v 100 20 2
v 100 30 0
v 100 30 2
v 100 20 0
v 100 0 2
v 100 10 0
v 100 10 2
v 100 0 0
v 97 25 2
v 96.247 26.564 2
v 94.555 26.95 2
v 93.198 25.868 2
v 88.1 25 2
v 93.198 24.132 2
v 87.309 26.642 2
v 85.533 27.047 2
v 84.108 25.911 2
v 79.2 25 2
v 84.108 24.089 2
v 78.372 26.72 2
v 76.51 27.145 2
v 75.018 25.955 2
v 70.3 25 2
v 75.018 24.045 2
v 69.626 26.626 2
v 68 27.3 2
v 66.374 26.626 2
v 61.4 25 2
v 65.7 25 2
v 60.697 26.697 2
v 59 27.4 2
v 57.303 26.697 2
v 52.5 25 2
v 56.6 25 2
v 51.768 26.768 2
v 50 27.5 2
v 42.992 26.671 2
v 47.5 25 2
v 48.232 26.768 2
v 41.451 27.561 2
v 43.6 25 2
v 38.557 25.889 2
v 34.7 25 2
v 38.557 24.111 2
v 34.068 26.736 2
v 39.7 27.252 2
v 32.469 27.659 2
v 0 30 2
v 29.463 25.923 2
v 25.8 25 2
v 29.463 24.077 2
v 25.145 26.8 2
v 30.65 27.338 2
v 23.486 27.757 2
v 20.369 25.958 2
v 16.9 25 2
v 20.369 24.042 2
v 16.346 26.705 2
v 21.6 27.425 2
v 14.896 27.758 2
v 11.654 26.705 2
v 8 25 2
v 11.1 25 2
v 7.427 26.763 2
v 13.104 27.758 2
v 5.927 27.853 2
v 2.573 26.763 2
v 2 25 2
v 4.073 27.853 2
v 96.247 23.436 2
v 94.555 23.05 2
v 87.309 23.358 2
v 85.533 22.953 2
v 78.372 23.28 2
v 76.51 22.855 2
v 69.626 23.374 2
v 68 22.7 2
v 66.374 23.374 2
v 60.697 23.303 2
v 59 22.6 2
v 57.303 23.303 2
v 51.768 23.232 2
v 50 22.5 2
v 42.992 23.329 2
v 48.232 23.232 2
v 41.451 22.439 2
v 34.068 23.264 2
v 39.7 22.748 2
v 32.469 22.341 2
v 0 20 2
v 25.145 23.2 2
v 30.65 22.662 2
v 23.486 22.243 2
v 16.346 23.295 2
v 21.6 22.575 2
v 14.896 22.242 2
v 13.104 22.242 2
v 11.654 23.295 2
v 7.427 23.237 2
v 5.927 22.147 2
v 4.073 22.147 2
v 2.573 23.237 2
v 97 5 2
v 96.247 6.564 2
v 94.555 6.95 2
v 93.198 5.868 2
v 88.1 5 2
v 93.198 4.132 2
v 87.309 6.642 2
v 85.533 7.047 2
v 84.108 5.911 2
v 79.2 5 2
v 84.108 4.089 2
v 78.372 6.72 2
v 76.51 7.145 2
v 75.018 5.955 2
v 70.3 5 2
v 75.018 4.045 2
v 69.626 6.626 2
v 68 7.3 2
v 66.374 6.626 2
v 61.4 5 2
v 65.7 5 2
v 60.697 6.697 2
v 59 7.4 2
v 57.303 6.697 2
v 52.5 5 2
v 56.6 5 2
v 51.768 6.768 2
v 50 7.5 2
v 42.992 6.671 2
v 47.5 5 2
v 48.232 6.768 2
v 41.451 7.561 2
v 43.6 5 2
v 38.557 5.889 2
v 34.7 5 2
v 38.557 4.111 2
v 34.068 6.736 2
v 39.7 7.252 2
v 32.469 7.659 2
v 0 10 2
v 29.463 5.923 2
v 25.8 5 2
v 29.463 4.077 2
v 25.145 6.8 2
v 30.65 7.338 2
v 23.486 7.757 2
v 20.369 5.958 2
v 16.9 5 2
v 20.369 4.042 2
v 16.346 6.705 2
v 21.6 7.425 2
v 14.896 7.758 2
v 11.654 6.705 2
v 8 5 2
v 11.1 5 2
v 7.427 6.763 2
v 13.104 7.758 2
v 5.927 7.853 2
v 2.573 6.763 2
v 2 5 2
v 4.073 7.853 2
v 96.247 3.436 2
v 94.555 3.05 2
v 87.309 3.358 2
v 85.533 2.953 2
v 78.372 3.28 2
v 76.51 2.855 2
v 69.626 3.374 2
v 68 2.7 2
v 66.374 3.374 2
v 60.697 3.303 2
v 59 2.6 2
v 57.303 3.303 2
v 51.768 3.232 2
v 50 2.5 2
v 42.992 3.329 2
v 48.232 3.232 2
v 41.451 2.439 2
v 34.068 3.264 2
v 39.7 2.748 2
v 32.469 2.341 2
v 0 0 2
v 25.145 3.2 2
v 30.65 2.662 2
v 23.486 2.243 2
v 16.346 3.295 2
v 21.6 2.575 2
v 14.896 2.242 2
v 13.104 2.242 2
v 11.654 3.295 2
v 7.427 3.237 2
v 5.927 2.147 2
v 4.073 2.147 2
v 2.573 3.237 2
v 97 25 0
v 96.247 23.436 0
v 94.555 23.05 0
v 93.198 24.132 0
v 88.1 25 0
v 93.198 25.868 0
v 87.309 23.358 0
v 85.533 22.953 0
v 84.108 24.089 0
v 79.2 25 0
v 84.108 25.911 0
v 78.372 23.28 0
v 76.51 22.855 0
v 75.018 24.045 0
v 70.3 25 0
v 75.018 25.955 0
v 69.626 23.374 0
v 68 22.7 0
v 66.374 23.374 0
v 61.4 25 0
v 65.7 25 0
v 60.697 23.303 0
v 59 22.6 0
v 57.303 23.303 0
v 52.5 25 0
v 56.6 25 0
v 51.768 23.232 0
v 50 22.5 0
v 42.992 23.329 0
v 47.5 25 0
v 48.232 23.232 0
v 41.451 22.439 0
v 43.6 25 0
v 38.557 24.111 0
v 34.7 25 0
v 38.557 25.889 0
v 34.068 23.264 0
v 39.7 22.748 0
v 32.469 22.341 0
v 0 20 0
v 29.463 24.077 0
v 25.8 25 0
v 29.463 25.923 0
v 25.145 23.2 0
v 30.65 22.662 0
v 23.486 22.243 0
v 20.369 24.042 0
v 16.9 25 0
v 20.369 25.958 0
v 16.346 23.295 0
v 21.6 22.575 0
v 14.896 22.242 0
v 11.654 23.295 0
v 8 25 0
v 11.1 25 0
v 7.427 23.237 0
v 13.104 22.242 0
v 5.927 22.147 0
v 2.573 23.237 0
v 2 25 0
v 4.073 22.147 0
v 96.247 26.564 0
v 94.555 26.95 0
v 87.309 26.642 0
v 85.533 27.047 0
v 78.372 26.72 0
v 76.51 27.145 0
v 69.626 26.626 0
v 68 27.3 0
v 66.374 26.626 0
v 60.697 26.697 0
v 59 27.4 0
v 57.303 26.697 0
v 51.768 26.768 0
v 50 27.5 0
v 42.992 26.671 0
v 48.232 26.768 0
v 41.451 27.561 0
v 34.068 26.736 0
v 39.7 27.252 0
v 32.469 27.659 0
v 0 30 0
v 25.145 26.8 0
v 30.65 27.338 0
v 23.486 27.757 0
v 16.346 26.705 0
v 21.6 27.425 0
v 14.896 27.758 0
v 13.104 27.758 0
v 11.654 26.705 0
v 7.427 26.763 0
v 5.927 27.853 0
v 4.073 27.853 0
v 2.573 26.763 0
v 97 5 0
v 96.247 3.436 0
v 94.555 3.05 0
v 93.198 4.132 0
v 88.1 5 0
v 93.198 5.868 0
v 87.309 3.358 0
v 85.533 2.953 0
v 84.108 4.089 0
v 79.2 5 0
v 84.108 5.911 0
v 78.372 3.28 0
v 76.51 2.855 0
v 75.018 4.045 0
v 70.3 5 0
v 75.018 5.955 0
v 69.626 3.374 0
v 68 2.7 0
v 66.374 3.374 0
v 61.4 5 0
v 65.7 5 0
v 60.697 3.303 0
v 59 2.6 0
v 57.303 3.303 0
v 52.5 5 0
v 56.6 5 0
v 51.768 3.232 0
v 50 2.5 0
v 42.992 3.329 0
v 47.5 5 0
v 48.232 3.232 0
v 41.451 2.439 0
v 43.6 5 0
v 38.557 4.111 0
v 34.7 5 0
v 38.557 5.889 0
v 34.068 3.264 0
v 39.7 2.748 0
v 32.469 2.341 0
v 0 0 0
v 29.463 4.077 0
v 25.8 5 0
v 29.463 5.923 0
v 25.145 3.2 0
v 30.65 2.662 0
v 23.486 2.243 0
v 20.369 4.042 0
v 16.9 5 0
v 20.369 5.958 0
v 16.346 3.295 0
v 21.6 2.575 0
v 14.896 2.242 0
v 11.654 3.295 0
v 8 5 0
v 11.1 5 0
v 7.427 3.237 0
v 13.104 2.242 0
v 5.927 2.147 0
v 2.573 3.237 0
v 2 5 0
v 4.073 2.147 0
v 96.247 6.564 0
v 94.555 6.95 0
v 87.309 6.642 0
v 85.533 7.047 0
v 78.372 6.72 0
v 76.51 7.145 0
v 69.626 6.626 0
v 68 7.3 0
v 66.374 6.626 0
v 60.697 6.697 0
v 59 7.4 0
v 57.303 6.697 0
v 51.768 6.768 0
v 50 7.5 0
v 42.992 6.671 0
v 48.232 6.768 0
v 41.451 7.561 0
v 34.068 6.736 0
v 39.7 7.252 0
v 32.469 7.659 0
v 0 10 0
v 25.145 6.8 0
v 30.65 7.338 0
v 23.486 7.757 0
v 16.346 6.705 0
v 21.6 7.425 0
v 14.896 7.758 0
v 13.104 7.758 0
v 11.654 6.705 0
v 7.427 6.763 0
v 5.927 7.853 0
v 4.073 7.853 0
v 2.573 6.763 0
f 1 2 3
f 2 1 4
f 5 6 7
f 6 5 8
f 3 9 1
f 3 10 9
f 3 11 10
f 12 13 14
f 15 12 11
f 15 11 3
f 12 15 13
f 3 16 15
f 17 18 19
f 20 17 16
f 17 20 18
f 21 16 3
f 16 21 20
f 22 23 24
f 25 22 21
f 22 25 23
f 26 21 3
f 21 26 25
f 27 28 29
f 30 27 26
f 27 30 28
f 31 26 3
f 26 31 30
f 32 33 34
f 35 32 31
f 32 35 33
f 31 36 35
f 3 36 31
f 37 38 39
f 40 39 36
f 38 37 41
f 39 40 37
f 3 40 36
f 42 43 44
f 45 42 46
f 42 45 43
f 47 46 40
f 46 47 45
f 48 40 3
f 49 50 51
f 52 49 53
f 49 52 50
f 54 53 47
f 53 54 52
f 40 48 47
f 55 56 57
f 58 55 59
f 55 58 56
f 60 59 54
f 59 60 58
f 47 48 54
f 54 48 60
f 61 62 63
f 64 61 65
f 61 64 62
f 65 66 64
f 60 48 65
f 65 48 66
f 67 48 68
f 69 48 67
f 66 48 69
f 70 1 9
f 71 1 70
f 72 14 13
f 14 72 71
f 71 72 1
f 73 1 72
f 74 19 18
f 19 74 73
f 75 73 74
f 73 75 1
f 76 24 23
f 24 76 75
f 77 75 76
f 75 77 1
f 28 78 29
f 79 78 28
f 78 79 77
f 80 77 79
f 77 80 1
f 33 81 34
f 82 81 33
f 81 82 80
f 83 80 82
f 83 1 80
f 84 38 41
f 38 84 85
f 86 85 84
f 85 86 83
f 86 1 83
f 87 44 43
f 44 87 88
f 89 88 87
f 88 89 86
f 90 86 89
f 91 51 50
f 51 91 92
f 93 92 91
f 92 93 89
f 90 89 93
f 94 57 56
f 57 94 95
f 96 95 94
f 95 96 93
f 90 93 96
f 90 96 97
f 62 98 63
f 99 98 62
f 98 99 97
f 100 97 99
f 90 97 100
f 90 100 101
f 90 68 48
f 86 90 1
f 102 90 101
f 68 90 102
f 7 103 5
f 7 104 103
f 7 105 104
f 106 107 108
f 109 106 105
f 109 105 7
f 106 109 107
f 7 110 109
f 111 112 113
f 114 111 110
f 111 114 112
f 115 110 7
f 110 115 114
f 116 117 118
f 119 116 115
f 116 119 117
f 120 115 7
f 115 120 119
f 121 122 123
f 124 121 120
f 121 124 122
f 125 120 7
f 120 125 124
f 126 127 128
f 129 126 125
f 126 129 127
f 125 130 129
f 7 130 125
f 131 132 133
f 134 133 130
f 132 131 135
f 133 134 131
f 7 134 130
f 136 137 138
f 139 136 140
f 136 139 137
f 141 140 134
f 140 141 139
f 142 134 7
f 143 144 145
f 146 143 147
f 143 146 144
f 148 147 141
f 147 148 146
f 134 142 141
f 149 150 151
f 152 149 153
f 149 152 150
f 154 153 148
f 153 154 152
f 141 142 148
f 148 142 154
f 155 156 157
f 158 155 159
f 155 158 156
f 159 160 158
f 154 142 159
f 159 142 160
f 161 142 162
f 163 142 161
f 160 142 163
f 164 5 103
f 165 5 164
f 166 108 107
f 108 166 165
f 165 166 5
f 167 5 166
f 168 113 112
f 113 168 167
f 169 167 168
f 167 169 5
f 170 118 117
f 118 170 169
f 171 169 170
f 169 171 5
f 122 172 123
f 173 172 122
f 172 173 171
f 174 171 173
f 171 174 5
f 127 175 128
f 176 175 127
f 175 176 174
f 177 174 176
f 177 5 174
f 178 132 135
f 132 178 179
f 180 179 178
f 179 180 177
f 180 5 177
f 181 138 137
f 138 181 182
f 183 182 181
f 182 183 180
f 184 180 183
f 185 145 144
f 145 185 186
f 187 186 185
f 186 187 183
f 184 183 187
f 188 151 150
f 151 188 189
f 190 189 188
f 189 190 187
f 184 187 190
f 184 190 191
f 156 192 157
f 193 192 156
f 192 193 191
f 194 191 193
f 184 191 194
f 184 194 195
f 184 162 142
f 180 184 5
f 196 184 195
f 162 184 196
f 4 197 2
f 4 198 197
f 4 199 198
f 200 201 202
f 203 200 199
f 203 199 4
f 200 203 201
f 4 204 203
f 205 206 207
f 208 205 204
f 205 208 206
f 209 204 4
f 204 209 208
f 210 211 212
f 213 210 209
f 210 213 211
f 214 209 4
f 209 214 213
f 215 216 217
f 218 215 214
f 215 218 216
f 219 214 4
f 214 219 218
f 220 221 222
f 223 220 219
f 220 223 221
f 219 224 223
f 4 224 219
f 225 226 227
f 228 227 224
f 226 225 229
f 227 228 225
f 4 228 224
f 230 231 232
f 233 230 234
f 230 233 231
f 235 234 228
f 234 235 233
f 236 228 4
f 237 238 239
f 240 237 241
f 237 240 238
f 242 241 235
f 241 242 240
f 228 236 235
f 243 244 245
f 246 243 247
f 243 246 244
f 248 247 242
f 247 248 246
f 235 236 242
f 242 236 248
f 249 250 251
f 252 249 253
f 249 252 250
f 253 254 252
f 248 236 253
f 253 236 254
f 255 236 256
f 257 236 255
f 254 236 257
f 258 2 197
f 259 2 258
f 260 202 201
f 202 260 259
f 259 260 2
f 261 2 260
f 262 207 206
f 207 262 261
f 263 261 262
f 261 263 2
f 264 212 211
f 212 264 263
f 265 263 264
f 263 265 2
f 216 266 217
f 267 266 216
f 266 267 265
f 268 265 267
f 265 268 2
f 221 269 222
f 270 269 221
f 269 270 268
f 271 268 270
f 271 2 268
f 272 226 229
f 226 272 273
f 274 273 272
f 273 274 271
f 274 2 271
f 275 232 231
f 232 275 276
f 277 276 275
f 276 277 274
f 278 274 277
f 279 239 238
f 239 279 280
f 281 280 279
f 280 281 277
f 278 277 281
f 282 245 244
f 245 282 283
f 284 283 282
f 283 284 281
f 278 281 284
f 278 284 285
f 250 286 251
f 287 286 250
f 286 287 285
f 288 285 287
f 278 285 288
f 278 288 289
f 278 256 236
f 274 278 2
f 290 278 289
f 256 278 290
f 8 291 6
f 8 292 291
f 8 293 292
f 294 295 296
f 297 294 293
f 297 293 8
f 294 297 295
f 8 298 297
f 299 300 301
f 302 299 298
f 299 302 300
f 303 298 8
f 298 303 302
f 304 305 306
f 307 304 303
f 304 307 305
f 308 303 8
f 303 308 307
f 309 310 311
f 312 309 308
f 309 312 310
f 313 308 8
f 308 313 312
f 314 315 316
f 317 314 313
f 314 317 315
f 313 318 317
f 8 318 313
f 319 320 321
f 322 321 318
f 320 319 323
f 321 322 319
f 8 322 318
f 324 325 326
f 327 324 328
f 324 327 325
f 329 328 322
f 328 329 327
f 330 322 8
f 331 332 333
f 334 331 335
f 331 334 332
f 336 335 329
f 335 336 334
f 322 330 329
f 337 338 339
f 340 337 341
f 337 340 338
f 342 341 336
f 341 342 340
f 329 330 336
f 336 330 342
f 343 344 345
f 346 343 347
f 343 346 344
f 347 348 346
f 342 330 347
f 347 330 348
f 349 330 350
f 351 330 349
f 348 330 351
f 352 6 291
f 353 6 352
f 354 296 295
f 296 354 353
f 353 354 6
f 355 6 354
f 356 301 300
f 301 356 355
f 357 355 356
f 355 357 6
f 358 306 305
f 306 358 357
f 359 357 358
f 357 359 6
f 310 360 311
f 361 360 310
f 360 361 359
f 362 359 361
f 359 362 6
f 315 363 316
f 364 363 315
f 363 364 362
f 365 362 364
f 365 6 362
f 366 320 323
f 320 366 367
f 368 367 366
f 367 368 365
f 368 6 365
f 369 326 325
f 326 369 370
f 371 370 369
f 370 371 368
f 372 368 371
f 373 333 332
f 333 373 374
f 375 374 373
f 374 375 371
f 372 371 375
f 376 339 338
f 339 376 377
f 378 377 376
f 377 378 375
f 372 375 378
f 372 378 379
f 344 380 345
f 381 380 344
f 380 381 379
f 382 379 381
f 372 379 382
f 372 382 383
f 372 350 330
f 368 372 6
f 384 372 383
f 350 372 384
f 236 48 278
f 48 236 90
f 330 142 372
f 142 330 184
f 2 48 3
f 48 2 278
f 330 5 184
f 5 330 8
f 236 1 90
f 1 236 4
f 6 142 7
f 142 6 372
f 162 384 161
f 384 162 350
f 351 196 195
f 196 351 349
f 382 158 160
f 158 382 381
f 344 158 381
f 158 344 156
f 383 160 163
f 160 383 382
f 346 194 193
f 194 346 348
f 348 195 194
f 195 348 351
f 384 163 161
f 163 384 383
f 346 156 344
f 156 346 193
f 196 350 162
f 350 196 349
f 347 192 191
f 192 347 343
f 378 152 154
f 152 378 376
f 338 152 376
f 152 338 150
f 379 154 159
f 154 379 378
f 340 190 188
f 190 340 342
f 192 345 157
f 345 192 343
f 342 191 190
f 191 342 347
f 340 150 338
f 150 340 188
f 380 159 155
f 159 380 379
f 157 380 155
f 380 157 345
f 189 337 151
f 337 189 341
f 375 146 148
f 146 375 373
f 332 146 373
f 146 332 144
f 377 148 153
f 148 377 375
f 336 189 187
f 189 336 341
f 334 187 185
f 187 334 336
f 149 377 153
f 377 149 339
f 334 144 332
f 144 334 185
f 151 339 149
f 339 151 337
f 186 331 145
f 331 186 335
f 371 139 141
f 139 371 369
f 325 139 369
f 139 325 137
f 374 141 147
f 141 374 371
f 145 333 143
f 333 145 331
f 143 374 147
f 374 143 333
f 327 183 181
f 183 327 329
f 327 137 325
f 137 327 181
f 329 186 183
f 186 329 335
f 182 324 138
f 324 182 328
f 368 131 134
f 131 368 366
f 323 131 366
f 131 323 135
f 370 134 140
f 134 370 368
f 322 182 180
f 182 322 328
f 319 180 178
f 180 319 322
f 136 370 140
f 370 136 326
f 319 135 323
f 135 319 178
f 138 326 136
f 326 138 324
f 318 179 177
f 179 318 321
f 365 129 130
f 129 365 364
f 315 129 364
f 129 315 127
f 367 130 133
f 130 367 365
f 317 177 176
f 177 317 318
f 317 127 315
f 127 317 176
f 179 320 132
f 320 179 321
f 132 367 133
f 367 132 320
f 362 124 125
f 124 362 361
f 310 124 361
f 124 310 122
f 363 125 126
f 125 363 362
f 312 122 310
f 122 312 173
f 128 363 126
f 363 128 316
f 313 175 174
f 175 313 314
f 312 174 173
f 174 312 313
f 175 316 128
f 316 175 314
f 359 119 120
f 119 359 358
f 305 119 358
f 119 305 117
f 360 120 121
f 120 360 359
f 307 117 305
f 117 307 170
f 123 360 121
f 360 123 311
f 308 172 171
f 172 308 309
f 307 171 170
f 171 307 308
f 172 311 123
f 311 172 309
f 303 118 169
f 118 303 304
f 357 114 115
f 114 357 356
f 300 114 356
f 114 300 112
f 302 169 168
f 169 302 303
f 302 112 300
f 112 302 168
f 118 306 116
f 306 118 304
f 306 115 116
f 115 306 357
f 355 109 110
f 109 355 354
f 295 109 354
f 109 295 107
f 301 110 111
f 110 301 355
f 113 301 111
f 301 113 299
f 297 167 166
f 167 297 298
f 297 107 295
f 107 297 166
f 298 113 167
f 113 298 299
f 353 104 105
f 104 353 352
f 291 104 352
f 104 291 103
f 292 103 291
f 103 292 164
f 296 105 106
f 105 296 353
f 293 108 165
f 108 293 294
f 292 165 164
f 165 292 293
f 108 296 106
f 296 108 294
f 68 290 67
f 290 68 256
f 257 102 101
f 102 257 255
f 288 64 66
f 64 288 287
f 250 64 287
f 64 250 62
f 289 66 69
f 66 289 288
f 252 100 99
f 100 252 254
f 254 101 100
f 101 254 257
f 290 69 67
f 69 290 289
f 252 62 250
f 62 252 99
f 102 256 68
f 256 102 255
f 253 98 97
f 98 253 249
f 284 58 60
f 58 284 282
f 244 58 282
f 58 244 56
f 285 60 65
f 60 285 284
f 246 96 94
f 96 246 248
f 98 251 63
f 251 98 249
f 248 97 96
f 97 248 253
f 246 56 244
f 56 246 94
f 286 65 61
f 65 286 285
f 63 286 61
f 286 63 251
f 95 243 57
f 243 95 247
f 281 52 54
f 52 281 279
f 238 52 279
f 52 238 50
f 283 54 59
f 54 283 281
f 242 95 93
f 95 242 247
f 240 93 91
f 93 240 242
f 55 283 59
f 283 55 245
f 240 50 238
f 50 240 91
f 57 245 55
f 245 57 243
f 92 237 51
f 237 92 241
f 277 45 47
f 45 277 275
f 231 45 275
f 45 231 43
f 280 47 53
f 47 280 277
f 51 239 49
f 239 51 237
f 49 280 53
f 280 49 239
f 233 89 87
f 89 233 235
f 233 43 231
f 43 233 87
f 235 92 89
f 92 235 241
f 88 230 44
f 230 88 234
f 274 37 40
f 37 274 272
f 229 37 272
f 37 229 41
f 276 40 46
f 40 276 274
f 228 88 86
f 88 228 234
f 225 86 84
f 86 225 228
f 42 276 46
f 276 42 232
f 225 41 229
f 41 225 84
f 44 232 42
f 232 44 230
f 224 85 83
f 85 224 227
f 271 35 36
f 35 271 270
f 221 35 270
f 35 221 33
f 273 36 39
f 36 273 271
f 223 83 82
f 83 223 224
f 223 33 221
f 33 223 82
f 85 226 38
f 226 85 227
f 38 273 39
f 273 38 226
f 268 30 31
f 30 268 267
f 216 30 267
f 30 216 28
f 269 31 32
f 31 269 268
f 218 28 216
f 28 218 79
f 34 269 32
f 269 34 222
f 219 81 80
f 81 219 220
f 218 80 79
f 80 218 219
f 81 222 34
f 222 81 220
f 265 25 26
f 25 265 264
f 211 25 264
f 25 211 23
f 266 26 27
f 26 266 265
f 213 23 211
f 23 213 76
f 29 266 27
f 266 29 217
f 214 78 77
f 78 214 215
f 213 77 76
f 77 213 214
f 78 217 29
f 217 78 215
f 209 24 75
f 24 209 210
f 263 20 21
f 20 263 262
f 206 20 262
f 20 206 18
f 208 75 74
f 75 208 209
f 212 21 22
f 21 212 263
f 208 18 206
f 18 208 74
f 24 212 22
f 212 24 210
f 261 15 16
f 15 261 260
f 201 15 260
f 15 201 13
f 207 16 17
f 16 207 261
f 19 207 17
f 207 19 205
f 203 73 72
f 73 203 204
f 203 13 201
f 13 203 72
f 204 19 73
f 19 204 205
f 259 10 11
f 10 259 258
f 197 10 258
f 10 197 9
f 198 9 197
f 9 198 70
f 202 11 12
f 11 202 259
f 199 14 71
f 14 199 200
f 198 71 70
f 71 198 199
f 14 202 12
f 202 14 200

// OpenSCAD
difference(){

cube([100,30,2]);
translate([0,10,0])
cube([100,10,3]);

translate([5,5,-1])
cylinder(3,3,3);

translate([14,5,-1])
cylinder(3,2.9,2.9);

translate([23,5,-1])
cylinder(3,2.8,2.8);

translate([32,5,-1])
cylinder(3,2.7,2.7);

translate([41,5,-1])
cylinder(3,2.6,2.6);

translate([50,5,-1])
cylinder(3,2.5,2.5);

translate([59,5,-1])
cylinder(3,2.4,2.4);

translate([68,5,-1])
cylinder(3,2.3,2.3);

translate([77,5,-1])
cylinder(3,2.2,2.2);

translate([86,5,-1])
cylinder(3,2.1,2.1);

translate([95,5,-1])
cylinder(3,2,2);


translate([5,25,-1])
cylinder(3,3,3);

translate([14,25,-1])
cylinder(3,2.9,2.9);

translate([23,25,-1])
cylinder(3,2.8,2.8);

translate([32,25,-1])
cylinder(3,2.7,2.7);

translate([41,25,-1])
cylinder(3,2.6,2.6);

translate([50,25,-1])
cylinder(3,2.5,2.5);

translate([59,25,-1])
cylinder(3,2.4,2.4);

translate([68,25,-1])
cylinder(3,2.3,2.3);

translate([77,25,-1])
cylinder(3,2.2,2.2);

translate([86,25,-1])
cylinder(3,2.1,2.1);

translate([95,25,-1])
cylinder(3,2,2);

}
